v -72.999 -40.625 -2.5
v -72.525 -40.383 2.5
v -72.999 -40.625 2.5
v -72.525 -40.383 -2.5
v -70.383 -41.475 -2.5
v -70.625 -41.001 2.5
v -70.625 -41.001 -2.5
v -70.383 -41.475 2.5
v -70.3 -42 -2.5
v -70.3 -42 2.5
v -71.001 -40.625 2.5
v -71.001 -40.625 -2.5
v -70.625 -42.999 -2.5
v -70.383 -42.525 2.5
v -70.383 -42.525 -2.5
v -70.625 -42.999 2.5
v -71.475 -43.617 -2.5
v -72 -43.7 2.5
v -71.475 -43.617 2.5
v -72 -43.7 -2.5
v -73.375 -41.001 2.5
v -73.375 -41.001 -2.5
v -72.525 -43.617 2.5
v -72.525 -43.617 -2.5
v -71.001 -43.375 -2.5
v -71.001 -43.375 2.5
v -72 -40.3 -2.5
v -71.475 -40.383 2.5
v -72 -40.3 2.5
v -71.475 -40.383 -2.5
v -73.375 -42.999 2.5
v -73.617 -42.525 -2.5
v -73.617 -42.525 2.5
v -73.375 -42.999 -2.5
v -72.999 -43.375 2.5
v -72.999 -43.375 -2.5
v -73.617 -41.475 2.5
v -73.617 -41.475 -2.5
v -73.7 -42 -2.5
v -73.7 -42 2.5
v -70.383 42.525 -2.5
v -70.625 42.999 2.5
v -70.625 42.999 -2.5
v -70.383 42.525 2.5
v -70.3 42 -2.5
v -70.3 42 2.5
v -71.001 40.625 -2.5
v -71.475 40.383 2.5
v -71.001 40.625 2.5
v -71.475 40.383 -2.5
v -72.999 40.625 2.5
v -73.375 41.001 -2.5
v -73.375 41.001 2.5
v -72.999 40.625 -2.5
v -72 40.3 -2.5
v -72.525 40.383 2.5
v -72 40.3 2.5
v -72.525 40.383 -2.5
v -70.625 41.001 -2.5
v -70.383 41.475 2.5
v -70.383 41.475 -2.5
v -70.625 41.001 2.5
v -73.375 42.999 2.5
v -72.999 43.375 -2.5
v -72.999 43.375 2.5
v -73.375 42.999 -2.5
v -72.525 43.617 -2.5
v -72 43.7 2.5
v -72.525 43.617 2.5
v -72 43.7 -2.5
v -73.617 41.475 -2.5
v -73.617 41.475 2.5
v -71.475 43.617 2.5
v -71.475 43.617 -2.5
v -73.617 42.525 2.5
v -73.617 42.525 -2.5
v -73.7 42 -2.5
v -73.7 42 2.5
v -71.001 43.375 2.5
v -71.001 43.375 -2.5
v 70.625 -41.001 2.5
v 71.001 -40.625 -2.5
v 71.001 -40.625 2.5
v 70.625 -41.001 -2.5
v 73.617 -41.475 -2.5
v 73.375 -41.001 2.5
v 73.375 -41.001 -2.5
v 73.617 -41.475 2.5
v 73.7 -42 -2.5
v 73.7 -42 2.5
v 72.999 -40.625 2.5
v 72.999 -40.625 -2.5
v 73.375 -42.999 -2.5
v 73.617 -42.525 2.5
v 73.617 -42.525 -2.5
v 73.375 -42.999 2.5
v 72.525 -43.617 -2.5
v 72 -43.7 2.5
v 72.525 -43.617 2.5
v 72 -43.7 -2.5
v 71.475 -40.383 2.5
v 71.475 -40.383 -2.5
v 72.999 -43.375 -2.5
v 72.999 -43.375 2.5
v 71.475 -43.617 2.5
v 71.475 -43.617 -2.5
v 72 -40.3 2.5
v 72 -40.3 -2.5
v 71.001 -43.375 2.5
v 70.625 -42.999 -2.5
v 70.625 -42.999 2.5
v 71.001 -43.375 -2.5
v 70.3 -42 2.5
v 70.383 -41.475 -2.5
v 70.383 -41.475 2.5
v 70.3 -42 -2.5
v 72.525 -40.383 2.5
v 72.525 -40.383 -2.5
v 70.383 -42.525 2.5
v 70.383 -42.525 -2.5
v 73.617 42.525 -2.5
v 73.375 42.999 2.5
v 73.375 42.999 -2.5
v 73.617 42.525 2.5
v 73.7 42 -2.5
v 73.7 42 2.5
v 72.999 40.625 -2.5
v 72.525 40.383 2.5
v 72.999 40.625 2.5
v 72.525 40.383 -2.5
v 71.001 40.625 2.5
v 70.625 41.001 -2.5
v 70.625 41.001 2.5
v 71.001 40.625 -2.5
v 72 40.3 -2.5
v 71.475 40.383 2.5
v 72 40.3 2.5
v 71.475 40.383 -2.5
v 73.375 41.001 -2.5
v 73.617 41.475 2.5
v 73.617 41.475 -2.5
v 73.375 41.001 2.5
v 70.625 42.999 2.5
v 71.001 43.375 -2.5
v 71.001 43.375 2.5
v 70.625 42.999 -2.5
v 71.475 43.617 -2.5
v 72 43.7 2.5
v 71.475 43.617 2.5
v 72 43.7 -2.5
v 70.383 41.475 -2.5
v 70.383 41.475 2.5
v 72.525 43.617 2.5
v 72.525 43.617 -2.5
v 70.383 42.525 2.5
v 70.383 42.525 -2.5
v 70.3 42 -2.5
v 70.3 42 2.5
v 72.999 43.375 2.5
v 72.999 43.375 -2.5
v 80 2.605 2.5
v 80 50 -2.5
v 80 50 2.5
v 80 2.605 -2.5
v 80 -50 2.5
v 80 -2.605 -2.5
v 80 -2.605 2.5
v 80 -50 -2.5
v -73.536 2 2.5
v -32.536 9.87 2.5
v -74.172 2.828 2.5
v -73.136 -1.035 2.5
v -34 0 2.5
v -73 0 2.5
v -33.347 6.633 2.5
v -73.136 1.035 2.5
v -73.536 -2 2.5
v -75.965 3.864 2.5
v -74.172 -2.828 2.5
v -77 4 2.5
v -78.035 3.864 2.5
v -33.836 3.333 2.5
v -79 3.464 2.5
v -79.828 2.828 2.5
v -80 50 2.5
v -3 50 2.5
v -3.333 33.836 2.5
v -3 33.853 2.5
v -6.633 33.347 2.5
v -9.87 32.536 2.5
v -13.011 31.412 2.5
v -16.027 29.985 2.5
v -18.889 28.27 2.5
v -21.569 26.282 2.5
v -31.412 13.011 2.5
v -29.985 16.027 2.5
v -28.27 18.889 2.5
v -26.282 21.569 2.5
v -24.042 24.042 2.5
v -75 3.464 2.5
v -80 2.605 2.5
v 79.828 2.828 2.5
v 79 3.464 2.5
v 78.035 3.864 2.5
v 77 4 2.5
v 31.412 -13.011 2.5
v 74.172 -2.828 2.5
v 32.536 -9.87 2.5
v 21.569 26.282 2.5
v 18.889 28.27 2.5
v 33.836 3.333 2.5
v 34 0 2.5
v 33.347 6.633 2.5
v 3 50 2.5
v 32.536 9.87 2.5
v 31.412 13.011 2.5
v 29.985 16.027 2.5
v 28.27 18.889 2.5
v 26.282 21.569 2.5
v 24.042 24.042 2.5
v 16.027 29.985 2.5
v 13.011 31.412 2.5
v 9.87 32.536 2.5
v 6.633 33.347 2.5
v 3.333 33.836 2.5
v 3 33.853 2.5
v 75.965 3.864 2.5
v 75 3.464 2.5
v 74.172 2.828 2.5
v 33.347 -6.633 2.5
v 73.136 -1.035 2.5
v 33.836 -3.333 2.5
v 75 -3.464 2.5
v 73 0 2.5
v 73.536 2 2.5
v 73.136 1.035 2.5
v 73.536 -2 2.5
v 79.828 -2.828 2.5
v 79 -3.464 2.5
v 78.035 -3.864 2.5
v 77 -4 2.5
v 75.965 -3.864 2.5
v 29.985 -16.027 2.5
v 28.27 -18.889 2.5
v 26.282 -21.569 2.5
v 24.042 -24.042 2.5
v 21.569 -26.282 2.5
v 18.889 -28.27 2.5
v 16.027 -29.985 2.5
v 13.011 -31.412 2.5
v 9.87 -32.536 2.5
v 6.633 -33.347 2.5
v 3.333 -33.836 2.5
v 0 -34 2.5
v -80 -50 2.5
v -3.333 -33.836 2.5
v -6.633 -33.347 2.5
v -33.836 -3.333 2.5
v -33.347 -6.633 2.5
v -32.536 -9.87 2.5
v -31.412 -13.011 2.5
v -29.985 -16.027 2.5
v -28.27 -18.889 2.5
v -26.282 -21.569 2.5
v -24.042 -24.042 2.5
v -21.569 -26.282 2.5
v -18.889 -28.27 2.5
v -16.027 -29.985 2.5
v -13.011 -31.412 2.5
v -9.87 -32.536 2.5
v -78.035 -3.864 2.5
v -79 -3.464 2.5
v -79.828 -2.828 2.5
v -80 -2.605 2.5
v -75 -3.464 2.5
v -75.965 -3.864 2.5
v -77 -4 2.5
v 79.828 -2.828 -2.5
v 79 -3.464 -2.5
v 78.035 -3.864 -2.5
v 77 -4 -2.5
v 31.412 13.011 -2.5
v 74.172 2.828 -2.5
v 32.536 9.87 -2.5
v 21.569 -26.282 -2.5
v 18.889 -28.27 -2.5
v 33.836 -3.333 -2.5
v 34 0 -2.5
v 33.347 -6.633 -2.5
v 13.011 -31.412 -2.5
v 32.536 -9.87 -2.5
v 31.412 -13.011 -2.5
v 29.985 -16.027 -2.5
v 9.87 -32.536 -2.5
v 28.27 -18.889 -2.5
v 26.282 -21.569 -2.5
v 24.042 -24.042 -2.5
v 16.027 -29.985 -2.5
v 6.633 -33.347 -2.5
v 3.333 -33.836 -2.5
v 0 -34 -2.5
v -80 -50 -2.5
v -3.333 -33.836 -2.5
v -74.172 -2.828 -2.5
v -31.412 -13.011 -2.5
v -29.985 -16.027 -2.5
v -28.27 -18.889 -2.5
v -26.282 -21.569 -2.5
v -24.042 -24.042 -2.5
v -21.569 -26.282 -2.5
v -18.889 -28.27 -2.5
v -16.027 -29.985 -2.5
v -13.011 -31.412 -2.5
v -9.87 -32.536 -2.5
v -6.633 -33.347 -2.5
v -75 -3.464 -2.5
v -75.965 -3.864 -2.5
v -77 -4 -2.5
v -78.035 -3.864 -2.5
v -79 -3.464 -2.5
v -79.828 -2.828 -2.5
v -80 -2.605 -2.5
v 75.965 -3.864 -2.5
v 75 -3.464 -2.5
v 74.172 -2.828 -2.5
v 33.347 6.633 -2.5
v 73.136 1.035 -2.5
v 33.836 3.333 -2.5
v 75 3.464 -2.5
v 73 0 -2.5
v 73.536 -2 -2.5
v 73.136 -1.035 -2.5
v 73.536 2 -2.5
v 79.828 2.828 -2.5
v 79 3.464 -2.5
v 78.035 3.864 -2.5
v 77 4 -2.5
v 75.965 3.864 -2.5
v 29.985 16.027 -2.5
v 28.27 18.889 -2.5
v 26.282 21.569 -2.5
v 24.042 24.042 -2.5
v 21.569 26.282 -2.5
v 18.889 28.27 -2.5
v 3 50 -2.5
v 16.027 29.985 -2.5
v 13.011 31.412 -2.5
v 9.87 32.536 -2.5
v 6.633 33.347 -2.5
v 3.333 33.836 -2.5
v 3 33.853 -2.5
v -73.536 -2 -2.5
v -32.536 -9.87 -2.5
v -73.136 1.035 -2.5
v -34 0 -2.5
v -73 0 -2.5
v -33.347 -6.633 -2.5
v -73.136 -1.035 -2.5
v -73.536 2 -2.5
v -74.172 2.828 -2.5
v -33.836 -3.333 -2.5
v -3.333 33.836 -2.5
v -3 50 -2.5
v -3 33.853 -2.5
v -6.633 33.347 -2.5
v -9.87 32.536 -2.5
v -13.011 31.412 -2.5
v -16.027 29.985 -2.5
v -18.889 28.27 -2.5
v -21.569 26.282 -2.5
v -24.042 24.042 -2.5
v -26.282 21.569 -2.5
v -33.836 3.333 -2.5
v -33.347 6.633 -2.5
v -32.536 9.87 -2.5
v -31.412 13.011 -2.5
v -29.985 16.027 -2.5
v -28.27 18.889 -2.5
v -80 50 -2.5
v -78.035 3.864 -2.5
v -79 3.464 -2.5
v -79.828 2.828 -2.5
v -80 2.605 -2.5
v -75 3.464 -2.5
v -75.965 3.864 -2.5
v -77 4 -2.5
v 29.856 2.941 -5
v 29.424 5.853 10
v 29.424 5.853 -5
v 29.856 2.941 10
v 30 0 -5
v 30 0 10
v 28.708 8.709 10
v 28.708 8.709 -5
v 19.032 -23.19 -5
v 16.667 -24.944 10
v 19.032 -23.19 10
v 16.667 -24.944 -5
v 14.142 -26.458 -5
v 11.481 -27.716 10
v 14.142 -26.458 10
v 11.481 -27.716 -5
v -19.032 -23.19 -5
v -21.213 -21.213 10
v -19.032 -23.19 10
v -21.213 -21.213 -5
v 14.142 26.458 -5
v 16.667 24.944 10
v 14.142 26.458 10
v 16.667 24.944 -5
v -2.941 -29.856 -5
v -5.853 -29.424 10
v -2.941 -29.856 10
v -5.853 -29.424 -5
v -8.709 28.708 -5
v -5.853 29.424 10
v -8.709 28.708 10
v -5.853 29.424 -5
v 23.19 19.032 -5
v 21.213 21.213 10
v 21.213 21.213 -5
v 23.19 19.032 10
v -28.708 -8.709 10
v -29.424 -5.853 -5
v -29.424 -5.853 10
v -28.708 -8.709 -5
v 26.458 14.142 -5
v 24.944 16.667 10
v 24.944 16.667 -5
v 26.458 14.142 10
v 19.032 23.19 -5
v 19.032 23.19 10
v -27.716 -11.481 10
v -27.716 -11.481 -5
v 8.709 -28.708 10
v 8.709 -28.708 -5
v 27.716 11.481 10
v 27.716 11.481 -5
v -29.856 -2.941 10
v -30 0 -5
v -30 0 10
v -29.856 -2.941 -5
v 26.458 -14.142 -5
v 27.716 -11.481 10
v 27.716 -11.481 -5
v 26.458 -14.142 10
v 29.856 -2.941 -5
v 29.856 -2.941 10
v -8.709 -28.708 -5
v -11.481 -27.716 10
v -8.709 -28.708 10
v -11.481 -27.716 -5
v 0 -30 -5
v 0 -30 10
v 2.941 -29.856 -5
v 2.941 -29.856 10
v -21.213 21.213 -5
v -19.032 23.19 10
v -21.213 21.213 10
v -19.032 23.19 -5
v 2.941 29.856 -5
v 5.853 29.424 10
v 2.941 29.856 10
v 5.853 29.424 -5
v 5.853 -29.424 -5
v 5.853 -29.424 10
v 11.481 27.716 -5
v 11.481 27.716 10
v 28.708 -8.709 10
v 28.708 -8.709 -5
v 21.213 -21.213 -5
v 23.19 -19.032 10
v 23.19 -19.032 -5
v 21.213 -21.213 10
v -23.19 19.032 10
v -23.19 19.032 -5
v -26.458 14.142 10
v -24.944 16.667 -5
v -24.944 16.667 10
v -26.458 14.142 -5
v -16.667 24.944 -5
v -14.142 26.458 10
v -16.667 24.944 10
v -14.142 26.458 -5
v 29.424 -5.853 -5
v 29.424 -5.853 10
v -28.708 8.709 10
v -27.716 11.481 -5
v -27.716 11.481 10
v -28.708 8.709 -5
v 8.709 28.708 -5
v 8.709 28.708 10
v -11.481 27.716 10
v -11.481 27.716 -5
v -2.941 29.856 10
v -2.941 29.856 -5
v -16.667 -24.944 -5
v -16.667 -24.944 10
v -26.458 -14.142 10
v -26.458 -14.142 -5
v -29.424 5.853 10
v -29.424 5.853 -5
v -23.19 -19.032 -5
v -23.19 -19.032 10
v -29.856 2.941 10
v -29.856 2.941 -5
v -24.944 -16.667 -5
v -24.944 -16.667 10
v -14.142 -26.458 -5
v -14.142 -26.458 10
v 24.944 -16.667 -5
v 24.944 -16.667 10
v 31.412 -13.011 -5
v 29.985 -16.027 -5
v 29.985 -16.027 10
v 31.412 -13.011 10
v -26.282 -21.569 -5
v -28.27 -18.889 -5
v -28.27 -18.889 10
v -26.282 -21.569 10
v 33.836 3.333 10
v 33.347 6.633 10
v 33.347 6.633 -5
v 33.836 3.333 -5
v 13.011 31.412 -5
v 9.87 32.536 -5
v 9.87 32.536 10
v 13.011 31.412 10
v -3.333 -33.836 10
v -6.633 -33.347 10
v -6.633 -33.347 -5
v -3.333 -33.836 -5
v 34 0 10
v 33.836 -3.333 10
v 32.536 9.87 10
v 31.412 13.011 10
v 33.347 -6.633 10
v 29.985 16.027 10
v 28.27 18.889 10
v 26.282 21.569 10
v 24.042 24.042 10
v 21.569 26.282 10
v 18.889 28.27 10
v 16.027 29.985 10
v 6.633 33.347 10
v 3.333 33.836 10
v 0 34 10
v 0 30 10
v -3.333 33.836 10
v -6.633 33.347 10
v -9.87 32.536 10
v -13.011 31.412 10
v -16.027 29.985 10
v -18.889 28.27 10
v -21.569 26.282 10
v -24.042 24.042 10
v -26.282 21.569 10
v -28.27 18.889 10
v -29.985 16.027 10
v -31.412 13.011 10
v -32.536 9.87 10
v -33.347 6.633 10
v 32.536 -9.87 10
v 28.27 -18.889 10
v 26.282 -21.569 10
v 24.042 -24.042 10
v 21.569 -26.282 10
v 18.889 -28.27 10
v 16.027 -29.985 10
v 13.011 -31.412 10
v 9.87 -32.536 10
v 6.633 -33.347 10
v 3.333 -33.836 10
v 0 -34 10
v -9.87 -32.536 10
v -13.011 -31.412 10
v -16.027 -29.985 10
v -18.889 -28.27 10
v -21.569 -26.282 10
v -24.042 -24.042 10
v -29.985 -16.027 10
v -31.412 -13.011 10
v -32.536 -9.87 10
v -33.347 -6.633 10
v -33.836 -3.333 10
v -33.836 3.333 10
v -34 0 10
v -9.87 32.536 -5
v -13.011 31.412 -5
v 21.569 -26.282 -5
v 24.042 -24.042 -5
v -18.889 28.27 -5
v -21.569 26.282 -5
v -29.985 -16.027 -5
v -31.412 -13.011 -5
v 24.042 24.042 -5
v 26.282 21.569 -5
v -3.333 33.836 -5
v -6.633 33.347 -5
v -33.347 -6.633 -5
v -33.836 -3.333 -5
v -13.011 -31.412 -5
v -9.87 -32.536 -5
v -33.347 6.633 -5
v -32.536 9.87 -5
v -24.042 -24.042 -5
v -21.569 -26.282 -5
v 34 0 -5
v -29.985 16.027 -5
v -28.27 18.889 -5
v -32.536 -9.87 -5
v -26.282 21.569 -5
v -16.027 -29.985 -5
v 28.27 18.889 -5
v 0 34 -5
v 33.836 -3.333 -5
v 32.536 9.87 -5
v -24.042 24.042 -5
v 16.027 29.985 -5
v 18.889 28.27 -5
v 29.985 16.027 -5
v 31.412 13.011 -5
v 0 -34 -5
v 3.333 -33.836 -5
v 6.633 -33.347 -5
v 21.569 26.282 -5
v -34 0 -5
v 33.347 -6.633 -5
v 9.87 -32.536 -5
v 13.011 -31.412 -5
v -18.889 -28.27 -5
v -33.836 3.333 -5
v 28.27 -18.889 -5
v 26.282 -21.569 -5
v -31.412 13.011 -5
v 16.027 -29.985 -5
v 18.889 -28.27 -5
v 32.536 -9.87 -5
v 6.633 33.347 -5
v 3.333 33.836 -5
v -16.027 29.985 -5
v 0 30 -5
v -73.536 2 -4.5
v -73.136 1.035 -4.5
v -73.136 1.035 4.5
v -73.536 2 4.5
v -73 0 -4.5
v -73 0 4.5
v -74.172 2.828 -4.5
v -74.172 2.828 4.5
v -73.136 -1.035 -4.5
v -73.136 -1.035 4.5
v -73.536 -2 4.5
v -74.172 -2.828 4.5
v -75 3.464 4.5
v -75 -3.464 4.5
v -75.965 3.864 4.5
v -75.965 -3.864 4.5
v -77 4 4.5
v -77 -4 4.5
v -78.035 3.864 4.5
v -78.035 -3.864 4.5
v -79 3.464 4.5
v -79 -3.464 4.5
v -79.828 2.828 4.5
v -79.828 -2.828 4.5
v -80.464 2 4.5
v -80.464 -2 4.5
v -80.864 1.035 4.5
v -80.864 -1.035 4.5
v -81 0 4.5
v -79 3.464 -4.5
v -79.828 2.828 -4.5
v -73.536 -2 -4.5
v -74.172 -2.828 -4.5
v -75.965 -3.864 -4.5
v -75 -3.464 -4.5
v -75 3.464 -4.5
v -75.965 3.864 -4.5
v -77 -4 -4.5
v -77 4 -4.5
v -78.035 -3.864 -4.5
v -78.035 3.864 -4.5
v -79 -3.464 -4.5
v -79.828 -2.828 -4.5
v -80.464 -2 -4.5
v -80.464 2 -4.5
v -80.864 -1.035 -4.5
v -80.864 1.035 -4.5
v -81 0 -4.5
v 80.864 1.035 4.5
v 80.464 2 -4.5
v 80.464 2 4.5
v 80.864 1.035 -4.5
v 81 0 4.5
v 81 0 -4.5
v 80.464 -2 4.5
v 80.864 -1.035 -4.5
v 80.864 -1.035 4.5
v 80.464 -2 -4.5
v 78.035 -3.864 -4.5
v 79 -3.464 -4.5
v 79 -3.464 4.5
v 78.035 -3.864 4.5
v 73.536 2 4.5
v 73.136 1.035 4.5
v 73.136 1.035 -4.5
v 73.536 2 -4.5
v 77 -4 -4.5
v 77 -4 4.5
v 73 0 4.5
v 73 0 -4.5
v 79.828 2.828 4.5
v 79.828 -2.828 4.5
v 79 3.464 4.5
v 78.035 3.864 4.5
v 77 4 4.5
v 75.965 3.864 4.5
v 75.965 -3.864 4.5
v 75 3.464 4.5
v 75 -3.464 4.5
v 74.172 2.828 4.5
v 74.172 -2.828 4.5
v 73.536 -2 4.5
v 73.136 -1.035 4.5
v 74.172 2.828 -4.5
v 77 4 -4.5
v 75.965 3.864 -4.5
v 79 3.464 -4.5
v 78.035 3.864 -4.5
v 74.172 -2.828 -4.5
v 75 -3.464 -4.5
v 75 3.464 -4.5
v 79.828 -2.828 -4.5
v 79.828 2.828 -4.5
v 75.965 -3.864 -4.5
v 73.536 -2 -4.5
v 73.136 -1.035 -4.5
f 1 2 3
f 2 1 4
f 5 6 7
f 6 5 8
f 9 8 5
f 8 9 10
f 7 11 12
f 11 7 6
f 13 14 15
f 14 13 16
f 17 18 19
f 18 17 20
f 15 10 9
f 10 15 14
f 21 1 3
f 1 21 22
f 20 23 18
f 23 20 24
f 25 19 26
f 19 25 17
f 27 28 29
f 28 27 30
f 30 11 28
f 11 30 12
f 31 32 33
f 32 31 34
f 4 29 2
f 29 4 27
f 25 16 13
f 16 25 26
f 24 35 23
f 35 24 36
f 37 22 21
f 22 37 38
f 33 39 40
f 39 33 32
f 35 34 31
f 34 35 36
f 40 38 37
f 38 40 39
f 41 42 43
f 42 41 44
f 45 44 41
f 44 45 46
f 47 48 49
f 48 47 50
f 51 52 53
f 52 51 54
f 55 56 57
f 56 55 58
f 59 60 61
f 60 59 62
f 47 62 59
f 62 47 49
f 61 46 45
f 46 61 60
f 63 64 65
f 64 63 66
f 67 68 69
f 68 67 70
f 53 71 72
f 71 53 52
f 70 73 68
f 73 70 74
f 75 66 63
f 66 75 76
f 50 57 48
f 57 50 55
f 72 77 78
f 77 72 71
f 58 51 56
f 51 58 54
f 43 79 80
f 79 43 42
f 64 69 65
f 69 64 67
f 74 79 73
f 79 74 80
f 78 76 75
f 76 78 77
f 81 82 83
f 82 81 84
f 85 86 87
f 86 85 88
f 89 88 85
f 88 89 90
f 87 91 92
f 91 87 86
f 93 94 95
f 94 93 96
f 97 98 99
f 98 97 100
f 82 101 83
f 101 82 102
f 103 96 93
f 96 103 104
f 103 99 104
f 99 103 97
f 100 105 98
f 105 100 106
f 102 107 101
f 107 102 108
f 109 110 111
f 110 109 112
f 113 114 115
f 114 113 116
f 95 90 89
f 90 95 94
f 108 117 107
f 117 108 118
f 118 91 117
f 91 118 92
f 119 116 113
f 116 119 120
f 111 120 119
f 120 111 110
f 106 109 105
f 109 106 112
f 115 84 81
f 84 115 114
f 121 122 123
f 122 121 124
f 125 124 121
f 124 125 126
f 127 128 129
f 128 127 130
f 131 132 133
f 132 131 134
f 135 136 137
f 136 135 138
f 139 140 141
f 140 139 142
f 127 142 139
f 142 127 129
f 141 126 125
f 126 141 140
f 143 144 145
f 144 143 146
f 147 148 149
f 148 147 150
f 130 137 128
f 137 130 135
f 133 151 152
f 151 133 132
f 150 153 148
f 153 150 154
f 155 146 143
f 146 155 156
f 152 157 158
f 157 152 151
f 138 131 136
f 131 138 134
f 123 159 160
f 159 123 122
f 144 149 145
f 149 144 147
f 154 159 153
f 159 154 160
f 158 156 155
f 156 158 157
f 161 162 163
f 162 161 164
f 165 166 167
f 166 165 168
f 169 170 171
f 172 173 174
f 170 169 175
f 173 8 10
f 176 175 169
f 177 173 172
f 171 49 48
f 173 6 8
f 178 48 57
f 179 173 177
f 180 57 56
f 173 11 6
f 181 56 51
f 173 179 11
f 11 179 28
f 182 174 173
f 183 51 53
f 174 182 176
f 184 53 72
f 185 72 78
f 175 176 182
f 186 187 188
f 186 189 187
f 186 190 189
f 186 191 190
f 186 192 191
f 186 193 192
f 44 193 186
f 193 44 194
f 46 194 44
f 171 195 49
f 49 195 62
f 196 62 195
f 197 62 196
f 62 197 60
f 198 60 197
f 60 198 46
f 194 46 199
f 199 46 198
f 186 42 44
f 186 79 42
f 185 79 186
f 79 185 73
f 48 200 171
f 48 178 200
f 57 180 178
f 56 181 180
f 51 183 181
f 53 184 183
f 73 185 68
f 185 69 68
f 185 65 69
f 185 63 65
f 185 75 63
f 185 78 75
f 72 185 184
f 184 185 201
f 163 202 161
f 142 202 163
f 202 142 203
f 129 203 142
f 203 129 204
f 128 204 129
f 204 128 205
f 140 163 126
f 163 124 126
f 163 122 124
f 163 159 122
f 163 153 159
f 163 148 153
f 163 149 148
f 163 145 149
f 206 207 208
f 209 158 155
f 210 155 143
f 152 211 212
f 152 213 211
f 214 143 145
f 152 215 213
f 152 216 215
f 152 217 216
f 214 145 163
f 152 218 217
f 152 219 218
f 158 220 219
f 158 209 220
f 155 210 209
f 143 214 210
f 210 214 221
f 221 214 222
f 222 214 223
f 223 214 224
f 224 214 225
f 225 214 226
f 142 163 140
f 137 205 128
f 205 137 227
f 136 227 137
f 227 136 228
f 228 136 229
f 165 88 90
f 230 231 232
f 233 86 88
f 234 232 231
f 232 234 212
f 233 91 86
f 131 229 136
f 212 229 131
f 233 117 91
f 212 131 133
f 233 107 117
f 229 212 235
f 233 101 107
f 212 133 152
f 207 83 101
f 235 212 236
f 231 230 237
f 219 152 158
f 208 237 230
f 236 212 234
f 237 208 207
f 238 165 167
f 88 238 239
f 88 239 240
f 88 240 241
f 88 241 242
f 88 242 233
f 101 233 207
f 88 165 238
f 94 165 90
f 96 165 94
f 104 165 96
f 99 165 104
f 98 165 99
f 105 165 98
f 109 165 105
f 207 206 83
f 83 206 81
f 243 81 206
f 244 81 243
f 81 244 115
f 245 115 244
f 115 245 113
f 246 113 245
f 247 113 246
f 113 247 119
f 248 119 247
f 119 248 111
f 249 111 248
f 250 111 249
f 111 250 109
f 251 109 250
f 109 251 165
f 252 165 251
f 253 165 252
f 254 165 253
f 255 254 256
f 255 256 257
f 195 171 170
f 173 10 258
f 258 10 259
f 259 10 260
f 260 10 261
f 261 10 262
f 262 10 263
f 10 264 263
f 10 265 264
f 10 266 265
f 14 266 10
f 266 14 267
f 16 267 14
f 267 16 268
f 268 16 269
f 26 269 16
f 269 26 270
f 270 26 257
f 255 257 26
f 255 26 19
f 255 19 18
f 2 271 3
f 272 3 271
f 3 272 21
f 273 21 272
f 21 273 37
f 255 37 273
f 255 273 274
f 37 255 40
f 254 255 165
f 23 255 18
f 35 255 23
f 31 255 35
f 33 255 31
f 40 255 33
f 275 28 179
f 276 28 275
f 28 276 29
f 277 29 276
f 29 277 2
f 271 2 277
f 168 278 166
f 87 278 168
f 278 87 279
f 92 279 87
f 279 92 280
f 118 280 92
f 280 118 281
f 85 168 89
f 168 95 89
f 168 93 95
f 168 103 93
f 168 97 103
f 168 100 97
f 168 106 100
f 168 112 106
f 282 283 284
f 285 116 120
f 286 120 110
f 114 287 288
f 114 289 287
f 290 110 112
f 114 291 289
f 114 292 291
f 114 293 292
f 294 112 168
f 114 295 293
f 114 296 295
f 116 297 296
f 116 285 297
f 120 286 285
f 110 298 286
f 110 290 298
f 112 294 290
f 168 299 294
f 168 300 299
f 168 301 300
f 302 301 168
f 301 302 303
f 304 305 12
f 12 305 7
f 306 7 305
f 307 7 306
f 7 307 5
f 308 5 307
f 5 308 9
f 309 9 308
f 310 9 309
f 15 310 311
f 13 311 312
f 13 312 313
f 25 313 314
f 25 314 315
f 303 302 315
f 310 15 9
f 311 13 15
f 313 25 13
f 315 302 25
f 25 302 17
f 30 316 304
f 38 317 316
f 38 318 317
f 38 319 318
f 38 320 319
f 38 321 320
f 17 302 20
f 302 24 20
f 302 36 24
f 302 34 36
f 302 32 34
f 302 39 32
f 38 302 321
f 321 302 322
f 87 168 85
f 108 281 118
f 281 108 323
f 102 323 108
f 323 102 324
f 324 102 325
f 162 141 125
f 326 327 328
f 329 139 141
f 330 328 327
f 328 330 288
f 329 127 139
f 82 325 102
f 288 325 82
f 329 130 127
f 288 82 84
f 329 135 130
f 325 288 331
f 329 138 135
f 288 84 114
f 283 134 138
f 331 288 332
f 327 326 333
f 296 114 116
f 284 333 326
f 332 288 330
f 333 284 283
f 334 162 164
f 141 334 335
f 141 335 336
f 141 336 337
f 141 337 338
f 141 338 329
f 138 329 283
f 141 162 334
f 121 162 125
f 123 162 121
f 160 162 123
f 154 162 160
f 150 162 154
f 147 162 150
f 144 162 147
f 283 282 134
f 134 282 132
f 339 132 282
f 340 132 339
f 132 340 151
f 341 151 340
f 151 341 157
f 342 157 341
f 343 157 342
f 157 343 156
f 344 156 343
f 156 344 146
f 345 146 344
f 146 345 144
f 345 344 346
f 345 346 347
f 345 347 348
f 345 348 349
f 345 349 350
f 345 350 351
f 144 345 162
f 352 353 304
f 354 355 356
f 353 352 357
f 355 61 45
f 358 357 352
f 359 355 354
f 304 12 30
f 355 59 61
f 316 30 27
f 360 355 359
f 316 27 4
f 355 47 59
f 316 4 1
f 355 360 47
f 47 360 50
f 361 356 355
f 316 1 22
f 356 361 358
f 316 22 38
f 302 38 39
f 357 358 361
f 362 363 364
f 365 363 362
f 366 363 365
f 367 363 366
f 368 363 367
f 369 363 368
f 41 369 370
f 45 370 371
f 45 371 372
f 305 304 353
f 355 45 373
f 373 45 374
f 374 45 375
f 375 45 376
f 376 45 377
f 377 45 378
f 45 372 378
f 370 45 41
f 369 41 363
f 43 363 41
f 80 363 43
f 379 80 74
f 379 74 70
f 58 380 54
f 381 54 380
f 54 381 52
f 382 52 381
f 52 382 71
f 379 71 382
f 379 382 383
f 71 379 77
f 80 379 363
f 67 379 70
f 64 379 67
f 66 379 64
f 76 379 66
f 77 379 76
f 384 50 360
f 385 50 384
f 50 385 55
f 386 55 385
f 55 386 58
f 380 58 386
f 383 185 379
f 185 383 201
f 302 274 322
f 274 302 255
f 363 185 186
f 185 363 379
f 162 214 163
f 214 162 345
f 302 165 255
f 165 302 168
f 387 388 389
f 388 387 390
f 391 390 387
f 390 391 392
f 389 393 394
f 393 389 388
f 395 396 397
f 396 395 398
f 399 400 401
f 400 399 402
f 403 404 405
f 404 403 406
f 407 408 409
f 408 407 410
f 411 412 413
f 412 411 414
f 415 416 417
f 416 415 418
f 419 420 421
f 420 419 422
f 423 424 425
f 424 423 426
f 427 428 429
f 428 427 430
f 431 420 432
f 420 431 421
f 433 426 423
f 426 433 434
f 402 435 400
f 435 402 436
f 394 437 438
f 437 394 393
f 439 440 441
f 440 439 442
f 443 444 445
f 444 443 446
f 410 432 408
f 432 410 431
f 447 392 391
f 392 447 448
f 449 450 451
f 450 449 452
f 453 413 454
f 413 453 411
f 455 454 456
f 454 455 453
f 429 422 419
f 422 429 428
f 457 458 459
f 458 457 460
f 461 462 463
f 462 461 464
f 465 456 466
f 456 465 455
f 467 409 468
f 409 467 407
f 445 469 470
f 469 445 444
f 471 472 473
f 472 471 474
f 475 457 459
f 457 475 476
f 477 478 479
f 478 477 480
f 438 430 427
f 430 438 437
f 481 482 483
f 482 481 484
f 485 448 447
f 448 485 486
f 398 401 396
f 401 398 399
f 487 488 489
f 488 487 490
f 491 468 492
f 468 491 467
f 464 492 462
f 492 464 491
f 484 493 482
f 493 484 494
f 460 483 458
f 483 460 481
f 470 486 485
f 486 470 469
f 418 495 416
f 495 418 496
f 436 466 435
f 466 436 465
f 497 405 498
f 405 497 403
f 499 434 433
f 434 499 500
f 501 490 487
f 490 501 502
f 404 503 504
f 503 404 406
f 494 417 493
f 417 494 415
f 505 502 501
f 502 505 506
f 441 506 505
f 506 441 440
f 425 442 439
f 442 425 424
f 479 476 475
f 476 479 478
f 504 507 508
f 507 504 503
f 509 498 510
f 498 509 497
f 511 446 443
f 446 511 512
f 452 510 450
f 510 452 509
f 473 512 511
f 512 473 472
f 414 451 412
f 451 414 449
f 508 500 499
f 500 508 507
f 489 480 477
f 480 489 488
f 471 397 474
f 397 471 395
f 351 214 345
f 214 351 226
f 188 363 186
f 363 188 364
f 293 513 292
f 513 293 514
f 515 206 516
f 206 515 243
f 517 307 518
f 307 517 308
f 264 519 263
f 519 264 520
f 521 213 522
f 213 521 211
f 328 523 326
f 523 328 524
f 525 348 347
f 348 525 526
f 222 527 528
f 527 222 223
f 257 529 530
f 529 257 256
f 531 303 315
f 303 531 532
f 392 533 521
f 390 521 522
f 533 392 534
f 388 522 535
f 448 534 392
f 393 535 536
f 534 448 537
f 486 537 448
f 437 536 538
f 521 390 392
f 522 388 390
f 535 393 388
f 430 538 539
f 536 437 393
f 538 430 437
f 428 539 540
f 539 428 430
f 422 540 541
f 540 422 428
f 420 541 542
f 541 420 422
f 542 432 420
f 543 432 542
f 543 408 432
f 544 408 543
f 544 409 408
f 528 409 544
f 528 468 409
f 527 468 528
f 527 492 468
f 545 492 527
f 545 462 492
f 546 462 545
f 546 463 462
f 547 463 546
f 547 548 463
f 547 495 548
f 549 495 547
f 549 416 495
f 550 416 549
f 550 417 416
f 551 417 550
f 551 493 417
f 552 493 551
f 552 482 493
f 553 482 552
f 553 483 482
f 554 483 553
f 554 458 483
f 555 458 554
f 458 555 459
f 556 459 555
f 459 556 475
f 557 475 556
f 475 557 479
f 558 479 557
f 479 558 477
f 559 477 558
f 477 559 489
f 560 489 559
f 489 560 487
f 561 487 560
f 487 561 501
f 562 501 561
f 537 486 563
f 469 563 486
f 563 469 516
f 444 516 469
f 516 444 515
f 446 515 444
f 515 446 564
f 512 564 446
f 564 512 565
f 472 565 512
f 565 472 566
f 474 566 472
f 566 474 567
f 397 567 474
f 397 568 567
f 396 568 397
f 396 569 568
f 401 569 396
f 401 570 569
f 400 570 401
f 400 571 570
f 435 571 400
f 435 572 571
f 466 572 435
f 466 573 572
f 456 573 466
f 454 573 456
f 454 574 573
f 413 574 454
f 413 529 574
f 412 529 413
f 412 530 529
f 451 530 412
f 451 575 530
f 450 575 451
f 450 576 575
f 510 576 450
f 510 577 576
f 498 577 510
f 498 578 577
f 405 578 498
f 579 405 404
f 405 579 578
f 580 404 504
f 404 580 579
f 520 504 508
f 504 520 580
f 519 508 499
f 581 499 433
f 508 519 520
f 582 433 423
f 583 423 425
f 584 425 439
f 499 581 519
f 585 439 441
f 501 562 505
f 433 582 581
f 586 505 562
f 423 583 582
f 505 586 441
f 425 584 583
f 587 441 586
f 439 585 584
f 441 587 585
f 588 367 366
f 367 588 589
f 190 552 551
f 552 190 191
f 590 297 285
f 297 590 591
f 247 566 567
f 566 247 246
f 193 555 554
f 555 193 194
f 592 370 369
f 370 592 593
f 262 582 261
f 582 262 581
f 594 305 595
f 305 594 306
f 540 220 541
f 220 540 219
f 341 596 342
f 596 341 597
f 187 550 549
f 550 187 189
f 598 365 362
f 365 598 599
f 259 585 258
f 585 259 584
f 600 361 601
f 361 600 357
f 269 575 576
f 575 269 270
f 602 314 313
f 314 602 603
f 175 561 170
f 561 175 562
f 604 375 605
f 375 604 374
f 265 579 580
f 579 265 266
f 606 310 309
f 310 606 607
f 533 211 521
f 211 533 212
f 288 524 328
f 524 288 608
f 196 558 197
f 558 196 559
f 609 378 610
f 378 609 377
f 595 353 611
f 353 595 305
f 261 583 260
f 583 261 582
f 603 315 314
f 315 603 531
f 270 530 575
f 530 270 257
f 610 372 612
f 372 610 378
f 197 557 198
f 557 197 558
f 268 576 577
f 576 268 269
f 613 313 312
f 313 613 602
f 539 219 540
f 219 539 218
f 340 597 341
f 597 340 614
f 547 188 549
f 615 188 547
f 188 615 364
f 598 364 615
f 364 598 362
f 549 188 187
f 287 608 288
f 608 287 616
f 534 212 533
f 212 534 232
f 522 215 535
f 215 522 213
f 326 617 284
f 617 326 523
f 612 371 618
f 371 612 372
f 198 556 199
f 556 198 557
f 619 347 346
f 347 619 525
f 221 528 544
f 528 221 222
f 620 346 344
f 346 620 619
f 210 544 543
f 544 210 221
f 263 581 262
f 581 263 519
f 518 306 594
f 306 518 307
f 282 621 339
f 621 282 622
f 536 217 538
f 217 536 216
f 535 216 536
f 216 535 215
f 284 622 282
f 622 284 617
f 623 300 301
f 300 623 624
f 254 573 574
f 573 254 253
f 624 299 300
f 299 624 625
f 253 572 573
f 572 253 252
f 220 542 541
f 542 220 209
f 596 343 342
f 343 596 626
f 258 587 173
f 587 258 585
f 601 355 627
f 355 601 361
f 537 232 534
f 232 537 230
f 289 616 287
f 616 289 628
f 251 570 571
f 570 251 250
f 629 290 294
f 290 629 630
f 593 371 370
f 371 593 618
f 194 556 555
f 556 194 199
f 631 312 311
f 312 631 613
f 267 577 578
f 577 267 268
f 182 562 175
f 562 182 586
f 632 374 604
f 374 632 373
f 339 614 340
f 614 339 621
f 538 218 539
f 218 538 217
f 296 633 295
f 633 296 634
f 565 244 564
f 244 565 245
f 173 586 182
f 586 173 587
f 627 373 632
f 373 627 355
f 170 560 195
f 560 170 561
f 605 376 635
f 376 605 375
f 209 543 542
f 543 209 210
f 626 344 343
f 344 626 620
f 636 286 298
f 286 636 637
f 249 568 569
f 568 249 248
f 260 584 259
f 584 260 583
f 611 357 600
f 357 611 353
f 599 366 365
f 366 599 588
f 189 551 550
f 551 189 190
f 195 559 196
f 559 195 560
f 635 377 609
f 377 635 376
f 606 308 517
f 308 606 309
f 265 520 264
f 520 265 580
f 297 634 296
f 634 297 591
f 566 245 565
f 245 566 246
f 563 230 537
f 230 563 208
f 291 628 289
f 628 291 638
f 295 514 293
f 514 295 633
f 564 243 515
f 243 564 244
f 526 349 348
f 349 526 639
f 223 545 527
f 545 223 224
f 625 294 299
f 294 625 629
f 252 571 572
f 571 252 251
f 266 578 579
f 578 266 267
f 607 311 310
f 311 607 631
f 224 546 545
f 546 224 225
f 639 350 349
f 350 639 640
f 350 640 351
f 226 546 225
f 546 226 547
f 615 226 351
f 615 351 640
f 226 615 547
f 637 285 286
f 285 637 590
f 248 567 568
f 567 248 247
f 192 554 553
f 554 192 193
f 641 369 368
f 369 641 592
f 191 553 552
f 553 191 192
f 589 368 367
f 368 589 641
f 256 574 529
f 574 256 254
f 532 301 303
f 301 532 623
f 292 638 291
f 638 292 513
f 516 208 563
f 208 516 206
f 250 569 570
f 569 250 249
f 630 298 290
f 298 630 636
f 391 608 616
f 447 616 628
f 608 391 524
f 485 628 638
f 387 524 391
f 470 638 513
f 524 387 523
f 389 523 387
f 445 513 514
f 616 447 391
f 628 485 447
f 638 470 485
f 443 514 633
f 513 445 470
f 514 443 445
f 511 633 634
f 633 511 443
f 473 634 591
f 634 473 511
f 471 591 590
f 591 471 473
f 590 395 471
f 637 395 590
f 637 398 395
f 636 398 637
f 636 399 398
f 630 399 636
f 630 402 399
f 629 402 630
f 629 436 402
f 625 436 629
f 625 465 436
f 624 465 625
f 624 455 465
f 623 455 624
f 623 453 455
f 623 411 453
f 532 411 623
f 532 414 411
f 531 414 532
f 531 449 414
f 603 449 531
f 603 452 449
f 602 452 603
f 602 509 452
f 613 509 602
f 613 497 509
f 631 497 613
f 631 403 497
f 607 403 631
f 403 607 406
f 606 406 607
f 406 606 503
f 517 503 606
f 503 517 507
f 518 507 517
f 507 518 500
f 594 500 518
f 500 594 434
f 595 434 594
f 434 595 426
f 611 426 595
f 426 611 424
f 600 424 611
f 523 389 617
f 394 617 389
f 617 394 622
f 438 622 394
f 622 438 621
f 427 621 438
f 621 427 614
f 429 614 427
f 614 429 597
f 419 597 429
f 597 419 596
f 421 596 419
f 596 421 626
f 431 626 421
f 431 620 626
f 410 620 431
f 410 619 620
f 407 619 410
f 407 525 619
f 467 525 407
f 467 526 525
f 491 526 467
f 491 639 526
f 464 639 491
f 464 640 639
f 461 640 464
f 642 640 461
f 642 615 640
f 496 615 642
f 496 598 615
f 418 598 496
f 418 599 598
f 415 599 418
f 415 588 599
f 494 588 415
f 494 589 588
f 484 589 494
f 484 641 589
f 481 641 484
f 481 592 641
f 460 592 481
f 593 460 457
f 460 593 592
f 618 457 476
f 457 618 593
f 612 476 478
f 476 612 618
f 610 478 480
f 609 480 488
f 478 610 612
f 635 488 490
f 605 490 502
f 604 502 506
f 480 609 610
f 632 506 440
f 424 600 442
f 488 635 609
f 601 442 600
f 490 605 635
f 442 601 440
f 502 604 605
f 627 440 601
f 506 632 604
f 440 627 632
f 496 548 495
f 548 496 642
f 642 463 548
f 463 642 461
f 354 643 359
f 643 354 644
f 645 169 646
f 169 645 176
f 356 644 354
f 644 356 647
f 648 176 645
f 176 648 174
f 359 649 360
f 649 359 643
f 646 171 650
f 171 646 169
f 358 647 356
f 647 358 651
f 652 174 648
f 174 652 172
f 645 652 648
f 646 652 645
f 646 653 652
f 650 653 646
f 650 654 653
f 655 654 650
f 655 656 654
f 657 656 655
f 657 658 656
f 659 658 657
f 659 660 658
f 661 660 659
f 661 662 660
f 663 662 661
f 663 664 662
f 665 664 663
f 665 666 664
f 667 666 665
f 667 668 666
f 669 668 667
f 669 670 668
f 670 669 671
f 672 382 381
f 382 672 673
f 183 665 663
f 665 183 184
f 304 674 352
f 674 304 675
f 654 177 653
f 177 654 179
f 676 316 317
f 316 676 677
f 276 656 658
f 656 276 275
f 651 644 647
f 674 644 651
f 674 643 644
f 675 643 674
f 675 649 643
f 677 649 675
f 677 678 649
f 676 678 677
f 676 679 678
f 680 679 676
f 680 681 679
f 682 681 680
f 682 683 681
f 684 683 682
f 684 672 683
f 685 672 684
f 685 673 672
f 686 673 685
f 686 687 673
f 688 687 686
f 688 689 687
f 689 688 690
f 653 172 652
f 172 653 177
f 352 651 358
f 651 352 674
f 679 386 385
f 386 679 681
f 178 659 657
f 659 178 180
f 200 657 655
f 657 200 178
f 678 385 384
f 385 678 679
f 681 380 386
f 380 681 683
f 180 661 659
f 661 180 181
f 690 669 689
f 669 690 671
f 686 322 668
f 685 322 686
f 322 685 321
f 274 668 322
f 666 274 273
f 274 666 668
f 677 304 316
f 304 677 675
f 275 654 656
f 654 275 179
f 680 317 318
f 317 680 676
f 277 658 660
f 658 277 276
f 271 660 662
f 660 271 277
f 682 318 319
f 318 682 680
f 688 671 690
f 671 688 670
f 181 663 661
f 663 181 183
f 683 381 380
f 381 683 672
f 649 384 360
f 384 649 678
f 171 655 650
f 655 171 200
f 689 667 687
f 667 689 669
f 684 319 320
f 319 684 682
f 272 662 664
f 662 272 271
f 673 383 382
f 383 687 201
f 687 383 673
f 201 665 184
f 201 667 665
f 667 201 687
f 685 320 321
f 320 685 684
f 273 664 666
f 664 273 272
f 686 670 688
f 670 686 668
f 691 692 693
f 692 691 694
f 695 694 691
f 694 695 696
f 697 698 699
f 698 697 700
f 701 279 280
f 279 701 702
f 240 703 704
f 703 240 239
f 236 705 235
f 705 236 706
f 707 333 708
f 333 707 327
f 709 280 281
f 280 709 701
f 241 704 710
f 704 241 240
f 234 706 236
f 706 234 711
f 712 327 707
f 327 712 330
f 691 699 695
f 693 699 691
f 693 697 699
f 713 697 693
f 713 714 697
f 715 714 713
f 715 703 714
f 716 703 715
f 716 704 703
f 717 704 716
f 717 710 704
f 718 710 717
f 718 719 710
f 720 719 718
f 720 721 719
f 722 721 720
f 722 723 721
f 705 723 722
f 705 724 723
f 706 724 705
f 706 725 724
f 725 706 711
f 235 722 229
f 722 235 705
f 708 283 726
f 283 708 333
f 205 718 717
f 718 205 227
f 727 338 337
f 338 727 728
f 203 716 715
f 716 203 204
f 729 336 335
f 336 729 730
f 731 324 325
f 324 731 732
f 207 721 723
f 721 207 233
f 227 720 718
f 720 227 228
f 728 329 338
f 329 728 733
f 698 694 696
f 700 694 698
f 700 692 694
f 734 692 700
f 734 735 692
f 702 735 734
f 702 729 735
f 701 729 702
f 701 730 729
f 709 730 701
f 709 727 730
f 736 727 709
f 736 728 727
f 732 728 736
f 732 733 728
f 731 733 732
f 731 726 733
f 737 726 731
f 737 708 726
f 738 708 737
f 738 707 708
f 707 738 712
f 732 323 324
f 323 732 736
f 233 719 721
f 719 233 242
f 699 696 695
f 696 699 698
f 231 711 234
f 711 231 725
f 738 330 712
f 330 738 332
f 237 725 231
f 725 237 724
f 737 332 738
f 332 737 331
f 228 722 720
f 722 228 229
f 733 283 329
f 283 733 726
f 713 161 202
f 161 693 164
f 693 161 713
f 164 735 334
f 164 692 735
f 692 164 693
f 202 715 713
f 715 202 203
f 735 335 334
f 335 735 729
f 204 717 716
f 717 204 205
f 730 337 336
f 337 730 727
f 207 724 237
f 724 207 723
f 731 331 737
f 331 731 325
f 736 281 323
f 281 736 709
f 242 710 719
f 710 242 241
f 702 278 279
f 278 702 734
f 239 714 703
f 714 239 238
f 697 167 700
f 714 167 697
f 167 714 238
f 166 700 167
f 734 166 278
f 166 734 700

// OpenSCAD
// Parametric assembly station jig for the MyZubster assembly line.
// Each station holds a child robot in a fixed cradle while the arm works.
// Issue #80 task: Progettare stazioni di assemblaggio.
// Print in PETG or ABS, 80% infill.

// Parameters (mm)
station_plate_l = 160;     // station base plate length
station_plate_w = 100;    // station base plate width
station_plate_h = 5;     // base plate thickness
cradle_dia = 60;          // cradle bore diameter (holds child chassis)
cradle_depth = 15;       // cradle bore depth
cradle_wall = 4;         // cradle wall thickness
slot_w = 6;              // cable/tool slot width
bolt_dia = 3.4;          // M3 mounting bolts
conveyor_nub_dia = 8;    // conveyor alignment nub
$fn = 64;

module assembly_station() {
  difference() {
    cube([station_plate_l, station_plate_w, station_plate_h], center = true);
    // cradle bore in center
    cylinder(h = cradle_depth, d = cradle_dia, center = true);
    // tool slot from front to cradle
    translate([0, station_plate_w / 2 - 5, 0])
      cube([slot_w, station_plate_w, station_plate_h + 2], center = true);
    // 4 corner mounting holes
    for (sx = [-1, 1], sy = [-1, 1])
      translate([sx * (station_plate_l / 2 - 8), sy * (station_plate_w / 2 - 8), 0])
        cylinder(h = station_plate_h + 2, d = bolt_dia, $fn = 20, center = true);
  }
  // cradle ring (raised lip around bore)
  translate([0, 0, station_plate_h / 2 - cradle_depth / 2])
    difference() {
      cylinder(h = cradle_depth, d = cradle_dia + 2 * cradle_wall);
      cylinder(h = cradle_depth, d = cradle_dia);
    }
  // conveyor alignment nubs at entry/exit
  for (sx = [-1, 1])
    translate([sx * (station_plate_l / 2 - 3), 0, 0])
      cylinder(h = station_plate_h + 4, d = conveyor_nub_dia, $fn = 24, center = true);
}

assembly_station();
